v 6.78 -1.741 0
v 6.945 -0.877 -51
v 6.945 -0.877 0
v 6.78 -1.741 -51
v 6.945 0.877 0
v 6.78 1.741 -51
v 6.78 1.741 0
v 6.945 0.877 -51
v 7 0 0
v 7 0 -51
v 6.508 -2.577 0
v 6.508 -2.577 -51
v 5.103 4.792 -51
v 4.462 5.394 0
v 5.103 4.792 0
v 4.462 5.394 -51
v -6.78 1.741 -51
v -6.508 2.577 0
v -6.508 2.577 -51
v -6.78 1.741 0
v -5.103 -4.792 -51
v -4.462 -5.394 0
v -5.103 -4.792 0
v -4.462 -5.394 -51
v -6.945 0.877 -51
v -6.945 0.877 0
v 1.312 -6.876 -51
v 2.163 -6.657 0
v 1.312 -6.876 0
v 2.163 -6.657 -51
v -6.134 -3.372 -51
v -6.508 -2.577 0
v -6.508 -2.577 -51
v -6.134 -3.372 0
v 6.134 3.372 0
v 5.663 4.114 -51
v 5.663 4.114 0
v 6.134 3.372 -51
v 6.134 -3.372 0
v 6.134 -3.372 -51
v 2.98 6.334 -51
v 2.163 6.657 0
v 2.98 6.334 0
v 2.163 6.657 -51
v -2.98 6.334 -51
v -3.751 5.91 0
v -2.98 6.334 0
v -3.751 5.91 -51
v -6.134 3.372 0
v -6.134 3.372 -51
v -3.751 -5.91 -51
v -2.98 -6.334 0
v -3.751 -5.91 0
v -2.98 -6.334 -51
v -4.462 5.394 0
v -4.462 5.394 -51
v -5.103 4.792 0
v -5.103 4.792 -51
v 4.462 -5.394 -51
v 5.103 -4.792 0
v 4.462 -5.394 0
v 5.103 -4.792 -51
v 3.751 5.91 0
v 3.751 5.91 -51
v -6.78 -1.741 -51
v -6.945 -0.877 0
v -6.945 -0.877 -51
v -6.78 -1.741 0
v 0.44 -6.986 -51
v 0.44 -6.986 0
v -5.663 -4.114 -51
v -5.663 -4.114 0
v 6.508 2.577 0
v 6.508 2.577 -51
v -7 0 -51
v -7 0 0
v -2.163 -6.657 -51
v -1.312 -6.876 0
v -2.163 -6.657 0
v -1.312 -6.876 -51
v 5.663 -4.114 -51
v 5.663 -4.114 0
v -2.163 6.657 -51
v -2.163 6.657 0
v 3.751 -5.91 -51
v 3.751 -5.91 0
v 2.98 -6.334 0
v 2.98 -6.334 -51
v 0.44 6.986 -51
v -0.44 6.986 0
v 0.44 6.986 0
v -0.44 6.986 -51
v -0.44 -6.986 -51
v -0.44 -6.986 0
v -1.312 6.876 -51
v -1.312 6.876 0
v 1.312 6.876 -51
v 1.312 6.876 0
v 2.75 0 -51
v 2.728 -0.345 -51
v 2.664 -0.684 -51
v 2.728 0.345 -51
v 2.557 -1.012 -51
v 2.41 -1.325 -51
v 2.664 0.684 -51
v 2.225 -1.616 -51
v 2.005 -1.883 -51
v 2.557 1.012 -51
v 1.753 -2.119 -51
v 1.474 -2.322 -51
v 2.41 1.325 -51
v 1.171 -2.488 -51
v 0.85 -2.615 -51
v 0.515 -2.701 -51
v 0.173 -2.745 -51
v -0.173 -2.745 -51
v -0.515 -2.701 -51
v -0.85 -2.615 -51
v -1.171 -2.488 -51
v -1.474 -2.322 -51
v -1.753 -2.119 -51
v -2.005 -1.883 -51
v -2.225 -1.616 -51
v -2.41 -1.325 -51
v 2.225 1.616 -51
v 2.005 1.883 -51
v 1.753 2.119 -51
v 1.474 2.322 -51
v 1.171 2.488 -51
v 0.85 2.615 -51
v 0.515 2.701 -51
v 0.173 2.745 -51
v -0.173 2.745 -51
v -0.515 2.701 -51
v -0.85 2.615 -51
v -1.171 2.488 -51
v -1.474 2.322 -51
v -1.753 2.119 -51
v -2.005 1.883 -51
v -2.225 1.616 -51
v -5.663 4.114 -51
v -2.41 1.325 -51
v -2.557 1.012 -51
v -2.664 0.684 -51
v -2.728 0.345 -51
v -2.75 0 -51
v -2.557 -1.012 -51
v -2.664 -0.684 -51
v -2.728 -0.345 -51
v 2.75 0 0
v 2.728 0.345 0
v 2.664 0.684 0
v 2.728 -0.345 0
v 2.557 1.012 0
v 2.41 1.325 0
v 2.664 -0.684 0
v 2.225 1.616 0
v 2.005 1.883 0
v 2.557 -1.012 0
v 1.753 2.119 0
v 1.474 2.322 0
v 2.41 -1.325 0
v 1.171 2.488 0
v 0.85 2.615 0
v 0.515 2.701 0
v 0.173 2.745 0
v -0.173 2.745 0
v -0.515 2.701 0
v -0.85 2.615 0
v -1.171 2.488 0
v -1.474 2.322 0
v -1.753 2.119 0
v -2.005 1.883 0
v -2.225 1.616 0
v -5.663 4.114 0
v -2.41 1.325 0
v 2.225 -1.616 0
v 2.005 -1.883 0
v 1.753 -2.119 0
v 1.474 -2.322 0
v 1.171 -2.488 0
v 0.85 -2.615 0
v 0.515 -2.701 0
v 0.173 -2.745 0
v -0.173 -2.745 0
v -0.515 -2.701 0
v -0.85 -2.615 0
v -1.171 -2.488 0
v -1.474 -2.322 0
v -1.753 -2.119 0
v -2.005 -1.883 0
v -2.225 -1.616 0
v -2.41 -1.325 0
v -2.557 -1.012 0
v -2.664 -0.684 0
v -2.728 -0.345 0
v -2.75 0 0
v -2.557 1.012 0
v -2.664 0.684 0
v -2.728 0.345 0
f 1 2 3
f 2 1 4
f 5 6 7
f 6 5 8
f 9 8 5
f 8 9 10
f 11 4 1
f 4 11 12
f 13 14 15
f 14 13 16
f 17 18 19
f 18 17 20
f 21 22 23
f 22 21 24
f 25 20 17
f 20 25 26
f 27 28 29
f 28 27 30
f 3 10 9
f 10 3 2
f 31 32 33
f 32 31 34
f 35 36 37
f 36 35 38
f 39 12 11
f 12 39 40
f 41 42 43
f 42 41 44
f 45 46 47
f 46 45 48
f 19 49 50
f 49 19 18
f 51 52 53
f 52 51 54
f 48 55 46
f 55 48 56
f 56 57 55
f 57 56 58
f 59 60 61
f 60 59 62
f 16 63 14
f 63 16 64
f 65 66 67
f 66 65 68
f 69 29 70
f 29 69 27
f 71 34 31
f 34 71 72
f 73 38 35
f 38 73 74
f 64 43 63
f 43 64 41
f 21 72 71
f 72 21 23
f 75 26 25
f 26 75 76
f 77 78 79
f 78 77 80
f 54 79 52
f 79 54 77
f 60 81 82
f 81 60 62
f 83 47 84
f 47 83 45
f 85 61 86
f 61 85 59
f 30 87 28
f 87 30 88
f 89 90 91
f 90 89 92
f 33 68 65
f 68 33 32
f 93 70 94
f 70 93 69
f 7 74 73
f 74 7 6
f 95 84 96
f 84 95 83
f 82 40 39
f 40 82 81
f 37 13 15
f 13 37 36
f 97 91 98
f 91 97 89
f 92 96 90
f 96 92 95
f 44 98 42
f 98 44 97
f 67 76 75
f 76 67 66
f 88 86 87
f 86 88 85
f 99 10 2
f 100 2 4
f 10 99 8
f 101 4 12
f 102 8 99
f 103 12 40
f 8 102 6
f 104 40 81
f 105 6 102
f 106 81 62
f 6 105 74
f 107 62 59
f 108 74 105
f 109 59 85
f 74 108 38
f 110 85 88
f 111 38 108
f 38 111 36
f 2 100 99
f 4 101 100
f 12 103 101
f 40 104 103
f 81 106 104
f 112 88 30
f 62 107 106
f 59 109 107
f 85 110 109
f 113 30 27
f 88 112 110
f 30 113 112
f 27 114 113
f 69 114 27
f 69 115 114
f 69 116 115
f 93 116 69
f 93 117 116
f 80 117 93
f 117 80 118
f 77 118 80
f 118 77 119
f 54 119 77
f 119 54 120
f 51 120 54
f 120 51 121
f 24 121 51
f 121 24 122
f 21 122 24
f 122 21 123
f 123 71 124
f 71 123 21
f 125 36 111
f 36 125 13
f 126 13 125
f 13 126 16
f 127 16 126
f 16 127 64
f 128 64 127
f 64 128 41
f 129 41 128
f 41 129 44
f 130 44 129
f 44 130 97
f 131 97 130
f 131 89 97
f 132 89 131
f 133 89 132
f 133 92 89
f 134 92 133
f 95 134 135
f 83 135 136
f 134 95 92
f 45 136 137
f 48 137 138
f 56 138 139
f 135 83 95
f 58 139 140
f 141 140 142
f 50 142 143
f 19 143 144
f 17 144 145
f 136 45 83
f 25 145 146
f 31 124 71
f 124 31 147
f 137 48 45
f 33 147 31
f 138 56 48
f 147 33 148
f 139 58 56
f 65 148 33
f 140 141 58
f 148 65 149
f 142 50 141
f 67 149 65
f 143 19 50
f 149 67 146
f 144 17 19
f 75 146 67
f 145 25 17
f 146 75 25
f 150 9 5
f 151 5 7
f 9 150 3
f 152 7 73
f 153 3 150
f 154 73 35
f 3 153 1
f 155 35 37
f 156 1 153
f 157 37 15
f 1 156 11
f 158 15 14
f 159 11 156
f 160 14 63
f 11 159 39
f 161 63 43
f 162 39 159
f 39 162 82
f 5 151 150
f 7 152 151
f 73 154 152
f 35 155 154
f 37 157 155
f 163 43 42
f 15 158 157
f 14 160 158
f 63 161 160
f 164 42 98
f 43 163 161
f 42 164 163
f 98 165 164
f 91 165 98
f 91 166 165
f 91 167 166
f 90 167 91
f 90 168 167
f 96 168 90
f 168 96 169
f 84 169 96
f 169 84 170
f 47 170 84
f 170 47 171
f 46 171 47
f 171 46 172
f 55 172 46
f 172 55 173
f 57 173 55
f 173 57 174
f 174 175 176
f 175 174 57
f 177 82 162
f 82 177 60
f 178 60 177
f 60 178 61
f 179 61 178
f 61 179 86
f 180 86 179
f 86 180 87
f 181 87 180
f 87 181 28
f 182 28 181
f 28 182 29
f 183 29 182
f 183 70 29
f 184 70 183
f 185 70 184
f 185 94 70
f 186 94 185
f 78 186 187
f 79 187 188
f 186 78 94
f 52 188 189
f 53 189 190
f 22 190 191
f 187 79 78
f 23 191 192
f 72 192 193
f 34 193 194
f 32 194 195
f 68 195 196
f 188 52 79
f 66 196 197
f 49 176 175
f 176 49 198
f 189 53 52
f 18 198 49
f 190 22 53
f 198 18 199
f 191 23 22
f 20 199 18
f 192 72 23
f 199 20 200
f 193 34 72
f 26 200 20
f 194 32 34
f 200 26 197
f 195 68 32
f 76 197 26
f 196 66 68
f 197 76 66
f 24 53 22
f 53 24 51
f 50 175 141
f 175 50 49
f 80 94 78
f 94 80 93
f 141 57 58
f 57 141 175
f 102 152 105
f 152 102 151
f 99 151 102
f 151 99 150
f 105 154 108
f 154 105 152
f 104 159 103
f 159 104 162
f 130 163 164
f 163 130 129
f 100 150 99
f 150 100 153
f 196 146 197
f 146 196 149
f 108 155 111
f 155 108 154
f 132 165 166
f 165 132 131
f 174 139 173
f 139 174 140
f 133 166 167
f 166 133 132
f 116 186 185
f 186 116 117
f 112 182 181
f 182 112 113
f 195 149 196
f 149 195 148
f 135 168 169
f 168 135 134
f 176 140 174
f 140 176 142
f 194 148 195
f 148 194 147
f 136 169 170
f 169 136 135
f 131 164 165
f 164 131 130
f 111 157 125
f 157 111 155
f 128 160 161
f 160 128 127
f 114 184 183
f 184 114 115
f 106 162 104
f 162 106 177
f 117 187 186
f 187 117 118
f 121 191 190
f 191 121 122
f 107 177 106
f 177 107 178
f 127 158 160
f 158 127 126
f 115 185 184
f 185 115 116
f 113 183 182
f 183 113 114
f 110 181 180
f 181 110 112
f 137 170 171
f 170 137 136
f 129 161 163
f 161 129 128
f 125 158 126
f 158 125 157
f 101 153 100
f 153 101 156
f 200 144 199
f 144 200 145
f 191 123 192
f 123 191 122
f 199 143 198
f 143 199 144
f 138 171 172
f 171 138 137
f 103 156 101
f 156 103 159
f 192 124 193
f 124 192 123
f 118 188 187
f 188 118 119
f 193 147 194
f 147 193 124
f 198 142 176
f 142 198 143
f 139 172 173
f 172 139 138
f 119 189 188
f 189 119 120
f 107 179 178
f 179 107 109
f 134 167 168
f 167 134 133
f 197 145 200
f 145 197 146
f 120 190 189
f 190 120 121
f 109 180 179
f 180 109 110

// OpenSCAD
$fn = 50;


difference() {
	union() {
		translate(v = [0, 0, -51.0000000000]) {
			cylinder(h = 51, r = 7.0000000000);
		}
		cylinder(h = 0, r = 16.0000000000);
	}
	union() {
		#translate(v = [0, 0, -51]) {
			cylinder(h = 51, r = 2.7500000000);
		}
	}
}
